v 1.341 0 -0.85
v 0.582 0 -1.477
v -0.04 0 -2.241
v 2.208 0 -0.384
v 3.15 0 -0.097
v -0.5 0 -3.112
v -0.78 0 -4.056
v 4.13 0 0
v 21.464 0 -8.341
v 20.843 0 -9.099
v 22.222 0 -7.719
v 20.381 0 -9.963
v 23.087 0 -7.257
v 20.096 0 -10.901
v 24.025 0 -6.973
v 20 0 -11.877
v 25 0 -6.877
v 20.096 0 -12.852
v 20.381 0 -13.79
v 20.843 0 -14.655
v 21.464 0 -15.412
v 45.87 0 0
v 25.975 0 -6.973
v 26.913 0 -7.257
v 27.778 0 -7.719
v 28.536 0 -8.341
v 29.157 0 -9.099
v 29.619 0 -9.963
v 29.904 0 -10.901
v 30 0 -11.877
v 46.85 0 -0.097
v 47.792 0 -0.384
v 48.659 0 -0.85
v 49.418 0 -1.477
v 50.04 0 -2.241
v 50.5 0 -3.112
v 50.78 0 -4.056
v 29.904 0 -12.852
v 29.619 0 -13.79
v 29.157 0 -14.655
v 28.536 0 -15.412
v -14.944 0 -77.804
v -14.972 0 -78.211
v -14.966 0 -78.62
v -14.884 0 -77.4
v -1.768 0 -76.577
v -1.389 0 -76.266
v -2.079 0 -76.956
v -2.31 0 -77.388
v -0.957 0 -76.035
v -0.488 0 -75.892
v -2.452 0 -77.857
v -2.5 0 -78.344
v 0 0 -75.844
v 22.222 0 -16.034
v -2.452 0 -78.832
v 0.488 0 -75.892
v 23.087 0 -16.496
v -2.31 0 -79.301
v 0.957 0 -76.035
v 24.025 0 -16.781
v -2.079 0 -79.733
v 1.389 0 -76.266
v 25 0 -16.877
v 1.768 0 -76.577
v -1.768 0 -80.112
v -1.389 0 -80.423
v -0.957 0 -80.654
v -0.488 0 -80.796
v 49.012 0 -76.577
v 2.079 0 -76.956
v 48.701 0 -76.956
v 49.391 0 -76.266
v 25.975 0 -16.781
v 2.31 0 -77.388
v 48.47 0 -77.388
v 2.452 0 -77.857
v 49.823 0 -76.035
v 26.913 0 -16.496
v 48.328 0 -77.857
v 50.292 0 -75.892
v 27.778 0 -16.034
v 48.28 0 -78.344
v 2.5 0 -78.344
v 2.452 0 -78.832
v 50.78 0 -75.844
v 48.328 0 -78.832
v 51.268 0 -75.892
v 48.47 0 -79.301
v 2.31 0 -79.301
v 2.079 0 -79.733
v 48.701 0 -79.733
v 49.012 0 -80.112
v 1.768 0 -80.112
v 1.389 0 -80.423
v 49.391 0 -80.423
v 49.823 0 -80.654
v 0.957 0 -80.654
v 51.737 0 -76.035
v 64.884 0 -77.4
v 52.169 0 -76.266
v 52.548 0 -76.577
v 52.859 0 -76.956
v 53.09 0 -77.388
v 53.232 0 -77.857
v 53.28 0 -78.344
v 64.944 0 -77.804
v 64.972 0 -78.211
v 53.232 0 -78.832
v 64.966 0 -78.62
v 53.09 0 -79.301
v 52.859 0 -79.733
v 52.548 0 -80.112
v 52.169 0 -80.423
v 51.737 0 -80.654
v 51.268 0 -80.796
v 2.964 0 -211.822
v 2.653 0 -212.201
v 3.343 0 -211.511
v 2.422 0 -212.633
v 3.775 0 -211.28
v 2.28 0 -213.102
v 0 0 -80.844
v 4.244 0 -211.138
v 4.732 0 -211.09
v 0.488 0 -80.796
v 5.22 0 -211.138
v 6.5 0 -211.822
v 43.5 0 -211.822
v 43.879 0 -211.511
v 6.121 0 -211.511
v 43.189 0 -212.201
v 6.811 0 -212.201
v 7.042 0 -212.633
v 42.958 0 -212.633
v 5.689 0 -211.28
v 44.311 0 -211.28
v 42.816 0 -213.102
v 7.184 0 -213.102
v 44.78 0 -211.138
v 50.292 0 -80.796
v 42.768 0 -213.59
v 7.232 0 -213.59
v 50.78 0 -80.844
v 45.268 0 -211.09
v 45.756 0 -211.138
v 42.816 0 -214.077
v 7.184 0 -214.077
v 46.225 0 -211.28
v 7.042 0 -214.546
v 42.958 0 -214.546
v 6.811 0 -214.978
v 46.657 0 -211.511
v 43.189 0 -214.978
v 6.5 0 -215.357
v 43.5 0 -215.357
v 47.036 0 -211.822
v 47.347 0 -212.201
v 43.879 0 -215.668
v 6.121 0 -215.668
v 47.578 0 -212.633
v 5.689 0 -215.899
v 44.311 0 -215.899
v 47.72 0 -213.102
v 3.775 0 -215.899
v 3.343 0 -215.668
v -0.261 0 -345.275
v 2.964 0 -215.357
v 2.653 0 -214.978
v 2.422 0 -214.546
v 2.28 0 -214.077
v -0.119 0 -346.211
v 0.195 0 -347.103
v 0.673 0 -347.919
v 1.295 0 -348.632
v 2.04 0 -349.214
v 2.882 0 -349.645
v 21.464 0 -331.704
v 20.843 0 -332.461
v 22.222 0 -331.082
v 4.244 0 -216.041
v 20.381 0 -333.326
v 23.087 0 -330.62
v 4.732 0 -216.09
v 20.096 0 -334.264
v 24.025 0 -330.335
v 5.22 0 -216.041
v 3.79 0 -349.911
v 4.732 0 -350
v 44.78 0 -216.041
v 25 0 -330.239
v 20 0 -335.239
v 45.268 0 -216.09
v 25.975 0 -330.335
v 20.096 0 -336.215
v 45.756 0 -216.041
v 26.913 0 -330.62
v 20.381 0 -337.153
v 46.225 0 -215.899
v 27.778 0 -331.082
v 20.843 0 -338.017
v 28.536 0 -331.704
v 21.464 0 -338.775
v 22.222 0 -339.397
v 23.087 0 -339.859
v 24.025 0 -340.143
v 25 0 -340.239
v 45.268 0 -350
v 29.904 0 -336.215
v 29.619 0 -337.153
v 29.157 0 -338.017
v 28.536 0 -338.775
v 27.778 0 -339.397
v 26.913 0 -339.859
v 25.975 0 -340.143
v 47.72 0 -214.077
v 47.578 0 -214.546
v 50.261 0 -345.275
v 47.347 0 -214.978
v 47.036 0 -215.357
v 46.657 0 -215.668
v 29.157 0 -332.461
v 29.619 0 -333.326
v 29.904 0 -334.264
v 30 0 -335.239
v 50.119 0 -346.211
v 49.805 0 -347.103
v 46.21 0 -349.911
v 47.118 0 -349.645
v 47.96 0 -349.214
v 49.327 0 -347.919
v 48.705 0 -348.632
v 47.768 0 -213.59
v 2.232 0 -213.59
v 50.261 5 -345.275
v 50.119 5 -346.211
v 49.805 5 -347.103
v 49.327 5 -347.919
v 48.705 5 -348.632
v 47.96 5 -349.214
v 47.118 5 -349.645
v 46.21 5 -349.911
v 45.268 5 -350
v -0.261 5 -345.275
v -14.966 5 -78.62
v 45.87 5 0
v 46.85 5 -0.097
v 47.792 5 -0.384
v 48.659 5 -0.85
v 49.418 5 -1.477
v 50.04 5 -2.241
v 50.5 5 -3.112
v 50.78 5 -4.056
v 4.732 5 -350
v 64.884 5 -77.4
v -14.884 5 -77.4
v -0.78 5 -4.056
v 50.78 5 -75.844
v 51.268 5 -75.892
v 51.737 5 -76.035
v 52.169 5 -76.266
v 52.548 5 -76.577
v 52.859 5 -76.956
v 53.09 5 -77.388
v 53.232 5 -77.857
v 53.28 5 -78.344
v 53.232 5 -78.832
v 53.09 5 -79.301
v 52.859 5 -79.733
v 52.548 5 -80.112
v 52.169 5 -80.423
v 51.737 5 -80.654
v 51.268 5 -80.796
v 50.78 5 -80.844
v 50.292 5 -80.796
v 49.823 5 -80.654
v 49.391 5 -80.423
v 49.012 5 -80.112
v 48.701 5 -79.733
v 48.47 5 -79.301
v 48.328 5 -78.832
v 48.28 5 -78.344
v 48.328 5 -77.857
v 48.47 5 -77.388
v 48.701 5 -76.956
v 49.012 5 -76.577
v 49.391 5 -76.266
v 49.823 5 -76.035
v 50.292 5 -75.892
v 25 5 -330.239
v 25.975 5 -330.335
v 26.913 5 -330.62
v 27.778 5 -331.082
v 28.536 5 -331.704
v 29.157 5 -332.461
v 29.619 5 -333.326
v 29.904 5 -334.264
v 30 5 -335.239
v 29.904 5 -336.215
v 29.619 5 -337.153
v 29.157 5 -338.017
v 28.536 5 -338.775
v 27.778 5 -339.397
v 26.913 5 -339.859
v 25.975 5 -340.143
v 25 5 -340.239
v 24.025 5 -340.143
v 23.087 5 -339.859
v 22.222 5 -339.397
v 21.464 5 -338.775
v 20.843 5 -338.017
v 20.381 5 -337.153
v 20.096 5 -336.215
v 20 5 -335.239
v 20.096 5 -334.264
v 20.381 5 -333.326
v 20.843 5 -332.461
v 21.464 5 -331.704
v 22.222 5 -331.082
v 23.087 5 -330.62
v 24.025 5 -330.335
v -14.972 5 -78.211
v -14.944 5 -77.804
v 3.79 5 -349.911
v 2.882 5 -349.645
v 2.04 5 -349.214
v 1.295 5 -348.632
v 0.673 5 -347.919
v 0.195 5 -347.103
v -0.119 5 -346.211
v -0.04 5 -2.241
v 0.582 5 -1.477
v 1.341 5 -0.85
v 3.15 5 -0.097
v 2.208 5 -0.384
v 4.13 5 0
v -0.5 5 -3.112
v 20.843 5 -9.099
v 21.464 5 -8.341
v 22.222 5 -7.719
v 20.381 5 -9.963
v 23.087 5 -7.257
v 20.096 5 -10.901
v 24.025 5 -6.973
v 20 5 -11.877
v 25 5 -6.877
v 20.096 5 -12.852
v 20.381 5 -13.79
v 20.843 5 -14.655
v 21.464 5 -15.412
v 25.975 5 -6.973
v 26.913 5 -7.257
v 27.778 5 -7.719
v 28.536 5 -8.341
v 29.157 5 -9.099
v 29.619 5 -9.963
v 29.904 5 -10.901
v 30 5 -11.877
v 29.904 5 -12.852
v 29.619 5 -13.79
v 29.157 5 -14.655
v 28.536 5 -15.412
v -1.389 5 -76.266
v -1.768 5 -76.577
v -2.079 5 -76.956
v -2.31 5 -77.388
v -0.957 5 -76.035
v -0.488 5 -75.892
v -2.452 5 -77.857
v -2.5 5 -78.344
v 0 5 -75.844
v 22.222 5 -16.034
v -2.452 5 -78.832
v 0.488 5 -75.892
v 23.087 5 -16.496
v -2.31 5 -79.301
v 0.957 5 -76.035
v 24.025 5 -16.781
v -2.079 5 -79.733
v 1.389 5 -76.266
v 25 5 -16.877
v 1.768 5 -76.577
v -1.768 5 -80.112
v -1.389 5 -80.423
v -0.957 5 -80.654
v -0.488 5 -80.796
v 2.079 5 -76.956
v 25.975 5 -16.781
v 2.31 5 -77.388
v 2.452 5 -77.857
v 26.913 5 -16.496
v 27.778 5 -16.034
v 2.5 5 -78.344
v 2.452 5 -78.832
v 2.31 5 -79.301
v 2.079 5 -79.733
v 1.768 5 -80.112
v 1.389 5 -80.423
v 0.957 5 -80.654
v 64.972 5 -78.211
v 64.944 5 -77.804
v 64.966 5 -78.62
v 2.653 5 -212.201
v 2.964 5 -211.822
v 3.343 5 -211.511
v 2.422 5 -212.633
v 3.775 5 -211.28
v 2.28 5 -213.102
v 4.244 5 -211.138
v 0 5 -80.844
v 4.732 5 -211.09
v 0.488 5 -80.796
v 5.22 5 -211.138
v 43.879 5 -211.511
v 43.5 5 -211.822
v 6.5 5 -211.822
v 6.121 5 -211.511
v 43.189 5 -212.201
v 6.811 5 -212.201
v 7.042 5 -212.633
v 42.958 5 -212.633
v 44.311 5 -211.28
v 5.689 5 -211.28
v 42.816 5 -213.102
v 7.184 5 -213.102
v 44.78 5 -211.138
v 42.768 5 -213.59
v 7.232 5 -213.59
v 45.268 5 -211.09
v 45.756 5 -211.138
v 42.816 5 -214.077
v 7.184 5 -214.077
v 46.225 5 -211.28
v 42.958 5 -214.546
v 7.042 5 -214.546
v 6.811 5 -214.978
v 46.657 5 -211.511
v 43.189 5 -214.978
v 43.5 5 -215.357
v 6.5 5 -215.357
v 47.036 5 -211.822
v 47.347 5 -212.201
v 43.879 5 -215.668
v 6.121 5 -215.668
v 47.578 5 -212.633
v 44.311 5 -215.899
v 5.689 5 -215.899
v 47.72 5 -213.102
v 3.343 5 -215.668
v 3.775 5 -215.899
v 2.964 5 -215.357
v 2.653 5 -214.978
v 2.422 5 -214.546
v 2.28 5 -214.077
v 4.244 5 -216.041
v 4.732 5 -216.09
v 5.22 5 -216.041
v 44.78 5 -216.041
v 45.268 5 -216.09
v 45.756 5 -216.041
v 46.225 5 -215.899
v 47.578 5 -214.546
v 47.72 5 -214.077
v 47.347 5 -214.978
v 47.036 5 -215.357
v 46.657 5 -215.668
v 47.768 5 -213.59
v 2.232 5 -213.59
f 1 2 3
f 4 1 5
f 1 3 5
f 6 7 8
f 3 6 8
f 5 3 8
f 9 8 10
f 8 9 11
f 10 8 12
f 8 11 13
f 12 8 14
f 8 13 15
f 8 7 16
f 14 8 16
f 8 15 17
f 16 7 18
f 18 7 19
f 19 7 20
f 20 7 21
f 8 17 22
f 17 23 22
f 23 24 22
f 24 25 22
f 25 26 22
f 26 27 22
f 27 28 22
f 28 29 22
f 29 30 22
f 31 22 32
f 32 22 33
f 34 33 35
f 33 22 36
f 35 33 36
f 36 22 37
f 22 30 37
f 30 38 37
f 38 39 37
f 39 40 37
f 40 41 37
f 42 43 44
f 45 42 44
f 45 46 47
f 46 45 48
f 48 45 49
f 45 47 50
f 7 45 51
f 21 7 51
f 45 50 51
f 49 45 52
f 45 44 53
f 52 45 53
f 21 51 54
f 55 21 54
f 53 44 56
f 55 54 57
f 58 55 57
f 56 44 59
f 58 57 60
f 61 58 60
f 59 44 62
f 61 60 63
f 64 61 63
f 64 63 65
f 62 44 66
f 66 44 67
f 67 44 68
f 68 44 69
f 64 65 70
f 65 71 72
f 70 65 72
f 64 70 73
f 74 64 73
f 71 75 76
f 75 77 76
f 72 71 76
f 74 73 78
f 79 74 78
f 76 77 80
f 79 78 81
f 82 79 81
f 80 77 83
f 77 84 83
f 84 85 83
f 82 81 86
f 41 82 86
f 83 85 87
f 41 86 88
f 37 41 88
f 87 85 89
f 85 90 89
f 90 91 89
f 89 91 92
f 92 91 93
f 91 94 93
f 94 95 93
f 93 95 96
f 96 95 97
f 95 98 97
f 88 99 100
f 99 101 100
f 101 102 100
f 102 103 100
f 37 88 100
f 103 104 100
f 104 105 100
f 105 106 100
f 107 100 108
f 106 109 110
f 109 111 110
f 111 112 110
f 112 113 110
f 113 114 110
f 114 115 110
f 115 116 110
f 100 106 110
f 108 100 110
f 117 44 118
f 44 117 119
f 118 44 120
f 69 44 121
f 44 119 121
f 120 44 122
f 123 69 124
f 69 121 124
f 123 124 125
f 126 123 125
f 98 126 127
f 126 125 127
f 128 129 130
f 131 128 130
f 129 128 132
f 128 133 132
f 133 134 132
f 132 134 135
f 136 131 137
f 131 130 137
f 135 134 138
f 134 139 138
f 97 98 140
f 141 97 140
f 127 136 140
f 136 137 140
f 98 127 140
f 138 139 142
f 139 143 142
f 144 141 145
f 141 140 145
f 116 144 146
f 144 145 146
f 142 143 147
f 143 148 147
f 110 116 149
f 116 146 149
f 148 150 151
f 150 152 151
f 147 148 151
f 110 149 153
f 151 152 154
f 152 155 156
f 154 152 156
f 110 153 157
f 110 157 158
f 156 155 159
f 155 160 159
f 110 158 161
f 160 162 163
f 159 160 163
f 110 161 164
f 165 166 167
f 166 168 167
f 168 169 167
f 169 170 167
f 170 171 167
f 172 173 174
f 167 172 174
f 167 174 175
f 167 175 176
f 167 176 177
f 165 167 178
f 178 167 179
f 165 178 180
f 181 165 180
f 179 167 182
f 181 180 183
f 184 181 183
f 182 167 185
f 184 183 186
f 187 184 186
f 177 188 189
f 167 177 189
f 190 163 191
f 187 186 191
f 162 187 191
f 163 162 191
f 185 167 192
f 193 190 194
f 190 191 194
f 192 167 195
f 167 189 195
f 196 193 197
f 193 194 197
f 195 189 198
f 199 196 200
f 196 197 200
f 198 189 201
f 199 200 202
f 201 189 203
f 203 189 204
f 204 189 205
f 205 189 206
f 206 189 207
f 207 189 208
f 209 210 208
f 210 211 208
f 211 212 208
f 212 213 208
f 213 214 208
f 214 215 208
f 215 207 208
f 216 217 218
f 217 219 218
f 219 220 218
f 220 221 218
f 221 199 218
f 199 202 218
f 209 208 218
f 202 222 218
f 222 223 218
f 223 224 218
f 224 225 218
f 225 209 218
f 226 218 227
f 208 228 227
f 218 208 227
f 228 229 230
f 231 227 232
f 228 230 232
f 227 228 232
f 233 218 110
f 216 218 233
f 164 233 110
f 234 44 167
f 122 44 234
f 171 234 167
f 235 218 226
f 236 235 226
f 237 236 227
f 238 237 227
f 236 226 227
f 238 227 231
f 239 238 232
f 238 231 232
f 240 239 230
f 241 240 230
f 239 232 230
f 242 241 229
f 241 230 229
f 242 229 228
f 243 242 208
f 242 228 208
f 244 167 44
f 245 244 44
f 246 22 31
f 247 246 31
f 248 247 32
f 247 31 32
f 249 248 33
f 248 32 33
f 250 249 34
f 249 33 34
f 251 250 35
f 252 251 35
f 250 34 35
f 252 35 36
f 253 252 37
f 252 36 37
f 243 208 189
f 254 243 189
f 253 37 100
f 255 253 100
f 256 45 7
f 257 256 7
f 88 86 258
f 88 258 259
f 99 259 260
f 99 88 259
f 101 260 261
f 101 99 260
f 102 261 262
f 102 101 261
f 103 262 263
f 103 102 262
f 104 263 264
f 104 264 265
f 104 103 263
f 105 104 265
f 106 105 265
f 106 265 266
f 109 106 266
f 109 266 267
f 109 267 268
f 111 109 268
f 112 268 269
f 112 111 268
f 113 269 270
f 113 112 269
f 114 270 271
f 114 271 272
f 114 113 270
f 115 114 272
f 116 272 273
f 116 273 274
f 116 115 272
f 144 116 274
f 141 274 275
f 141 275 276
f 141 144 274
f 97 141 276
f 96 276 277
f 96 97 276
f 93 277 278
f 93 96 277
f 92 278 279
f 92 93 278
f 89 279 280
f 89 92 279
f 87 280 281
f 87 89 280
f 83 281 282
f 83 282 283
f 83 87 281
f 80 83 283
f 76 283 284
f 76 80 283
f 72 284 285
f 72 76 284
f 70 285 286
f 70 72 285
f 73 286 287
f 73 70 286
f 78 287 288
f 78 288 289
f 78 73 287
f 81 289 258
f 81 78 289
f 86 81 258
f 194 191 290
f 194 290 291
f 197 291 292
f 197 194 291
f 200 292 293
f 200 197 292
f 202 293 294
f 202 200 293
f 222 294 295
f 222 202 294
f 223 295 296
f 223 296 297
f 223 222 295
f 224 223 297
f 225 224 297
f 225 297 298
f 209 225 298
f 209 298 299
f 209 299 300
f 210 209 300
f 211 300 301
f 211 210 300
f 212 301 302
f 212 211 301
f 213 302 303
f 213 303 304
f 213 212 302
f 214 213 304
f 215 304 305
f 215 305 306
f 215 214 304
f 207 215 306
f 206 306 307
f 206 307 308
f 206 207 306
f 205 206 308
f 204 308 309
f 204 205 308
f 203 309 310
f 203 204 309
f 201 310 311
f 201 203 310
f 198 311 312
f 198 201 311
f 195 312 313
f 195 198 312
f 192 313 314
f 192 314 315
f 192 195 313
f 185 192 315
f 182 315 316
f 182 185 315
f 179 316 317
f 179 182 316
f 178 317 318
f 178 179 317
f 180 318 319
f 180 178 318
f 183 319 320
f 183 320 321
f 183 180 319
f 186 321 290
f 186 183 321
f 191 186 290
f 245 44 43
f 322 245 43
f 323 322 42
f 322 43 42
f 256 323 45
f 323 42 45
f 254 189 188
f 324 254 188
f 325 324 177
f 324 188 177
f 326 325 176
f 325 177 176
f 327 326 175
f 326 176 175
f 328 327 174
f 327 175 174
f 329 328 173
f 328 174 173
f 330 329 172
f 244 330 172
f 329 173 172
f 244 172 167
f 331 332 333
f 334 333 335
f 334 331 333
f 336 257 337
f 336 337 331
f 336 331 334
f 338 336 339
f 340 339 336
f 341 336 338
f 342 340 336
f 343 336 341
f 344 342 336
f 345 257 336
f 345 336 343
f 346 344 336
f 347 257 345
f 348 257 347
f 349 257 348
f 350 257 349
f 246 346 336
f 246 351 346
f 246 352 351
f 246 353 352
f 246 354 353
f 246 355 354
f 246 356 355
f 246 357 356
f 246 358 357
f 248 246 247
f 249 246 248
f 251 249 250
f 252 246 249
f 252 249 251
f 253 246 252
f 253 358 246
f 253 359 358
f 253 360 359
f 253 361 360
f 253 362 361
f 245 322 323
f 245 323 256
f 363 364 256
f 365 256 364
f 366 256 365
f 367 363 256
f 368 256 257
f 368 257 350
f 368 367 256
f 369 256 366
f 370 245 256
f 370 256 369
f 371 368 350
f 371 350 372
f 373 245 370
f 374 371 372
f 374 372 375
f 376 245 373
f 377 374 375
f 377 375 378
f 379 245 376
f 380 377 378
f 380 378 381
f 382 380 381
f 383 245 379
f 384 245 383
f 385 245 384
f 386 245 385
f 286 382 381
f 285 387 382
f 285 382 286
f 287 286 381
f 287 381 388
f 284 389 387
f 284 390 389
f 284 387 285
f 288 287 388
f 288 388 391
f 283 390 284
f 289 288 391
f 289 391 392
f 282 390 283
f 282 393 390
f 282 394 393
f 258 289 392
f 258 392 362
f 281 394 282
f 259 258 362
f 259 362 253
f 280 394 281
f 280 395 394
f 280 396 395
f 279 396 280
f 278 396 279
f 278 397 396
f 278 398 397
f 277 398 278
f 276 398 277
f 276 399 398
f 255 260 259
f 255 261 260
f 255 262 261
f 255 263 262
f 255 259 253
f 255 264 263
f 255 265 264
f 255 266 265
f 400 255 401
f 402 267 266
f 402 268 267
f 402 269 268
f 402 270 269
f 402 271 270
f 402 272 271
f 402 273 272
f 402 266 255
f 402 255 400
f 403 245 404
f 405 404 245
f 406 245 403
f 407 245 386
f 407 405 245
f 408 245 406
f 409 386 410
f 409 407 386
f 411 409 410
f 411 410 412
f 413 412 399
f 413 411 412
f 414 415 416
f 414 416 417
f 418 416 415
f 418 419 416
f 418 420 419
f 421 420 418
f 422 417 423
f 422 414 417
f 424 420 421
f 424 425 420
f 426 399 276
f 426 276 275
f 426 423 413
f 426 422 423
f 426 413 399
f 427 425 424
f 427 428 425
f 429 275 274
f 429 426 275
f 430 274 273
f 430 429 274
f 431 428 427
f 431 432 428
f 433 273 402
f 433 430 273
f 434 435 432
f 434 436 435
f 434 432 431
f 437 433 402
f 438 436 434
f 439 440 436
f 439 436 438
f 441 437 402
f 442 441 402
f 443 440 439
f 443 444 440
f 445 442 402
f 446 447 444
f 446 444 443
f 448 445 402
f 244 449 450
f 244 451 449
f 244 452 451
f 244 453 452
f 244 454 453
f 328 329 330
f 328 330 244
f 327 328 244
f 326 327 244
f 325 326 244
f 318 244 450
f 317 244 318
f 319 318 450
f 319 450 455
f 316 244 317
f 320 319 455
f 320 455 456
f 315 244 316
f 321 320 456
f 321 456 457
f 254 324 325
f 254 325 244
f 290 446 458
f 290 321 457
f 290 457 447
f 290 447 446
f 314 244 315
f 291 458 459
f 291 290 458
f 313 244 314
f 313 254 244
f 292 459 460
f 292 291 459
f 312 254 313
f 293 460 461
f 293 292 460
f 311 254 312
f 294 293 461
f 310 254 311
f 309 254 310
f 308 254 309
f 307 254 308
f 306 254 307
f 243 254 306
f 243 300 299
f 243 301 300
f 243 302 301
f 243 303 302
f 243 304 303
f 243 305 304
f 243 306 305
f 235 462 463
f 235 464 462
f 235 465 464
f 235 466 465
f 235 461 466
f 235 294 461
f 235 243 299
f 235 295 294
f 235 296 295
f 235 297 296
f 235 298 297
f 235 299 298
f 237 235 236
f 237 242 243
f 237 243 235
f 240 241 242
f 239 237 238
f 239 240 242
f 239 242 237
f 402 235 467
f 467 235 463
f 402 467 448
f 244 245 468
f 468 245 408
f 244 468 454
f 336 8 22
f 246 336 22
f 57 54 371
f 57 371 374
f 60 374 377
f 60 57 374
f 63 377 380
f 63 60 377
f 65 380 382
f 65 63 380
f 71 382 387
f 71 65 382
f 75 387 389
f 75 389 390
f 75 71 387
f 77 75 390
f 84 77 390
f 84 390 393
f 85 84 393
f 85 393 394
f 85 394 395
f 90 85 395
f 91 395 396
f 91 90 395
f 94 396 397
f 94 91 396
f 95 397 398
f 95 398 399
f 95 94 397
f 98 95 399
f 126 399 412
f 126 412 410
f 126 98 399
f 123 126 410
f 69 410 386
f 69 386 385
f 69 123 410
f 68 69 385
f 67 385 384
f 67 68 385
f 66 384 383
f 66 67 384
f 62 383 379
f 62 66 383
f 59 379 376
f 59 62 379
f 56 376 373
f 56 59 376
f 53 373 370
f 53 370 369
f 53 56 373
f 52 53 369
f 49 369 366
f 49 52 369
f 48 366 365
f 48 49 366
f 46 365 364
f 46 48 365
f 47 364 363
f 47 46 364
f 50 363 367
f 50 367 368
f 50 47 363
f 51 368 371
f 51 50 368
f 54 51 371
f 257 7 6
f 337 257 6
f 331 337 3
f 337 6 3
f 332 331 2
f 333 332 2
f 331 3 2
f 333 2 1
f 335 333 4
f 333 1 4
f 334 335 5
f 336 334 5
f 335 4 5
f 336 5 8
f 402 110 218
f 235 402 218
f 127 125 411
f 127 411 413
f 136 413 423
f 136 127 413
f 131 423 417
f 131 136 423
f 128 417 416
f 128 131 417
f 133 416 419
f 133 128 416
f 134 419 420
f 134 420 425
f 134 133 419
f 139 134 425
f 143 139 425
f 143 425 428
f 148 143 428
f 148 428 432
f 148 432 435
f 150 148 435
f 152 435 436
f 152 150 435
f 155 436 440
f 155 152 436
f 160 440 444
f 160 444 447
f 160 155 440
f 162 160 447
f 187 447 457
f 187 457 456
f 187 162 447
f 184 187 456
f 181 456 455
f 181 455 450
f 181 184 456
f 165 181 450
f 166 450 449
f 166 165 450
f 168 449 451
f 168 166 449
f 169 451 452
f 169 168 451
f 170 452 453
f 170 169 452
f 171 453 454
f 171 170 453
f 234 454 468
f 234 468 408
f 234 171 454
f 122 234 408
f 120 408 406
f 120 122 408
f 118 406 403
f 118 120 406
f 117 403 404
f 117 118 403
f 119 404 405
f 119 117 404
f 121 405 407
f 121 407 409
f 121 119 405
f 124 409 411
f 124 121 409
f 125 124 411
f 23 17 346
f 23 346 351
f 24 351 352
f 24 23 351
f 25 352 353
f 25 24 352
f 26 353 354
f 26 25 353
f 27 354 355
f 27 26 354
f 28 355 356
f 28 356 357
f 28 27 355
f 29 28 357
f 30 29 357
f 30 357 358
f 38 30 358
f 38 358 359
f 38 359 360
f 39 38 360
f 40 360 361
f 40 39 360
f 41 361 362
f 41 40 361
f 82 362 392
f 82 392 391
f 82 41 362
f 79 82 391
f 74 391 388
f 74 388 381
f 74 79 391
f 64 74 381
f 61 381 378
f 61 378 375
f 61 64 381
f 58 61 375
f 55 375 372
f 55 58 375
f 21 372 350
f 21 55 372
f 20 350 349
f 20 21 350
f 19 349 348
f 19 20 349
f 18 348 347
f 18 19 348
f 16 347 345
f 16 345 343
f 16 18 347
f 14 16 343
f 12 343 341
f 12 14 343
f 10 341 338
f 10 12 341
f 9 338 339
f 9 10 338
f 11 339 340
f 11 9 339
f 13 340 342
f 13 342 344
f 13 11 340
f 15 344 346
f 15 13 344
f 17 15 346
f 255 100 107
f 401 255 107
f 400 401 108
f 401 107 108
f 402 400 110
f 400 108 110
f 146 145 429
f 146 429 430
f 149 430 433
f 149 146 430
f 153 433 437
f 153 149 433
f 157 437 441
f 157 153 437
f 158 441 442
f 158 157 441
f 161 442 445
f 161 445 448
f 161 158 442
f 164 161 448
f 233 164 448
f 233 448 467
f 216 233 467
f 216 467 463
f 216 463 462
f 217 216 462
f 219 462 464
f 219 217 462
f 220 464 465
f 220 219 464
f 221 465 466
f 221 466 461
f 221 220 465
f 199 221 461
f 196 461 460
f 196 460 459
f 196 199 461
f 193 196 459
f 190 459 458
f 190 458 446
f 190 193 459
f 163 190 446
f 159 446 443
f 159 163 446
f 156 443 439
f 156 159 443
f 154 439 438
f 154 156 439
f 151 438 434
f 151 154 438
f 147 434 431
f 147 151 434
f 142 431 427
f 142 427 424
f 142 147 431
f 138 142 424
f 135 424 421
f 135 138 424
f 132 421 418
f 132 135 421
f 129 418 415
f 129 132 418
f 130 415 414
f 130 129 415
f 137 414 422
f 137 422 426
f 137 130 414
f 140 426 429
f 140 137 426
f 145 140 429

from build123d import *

# Parameters (mm, degrees)
SKETCH1_R           = 2.5
SKETCH1_R_2         = 5
BOSS_EXTRUDE1_DEPTH = 5


with BuildPart() as part:
    # Sketch1 → Boss-Extrude1 (new body)
    with BuildSketch(Plane(origin=(0, 0, 0), x_dir=(1, 0, 0), z_dir=(0, 1, 0))):
        with BuildLine():
            Line((4.130127217, 0), (45.869872783, 0))
            ThreePointArc((45.869872783, 0), (49.054139071, 1.145074812), (50.779916111, 4.055820718))
            Line((50.779916111, 4.055820718), (64.883723024, 77.400263156))
            ThreePointArc((64.883723024, 77.400263156), (64.962312899, 78.007487301), (64.966093723, 78.619764391))
            Line((64.966093723, 78.619764391), (50.260556832, 345.275321952))
            ThreePointArc((50.260556832, 345.275321952), (48.704957481, 348.63157058), (45.268142804, 350))
            Line((45.268142804, 350), (4.731857196, 350))
            ThreePointArc((4.731857196, 350), (1.295042519, 348.63157058), (-0.260556832, 345.275321952))
            Line((-0.260556832, 345.275321952), (-14.966093723, 78.619764391))
            ThreePointArc((-14.966093723, 78.619764391), (-14.962312899, 78.007487301), (-14.883723024, 77.400263156))
            Line((-14.883723024, 77.400263156), (-0.779916111, 4.055820718))
            ThreePointArc((-0.779916111, 4.055820718), (0.945860929, 1.145074812), (4.130127217, 0))
        make_face()
        with Locations(Location((50.779916111, 78.344442439, 0), (0, 0, 270))):
            Circle(SKETCH1_R, mode=Mode.SUBTRACT)
        with Locations(Location((0, 78.344442439, 0), (0, 0, 270))):
            Circle(SKETCH1_R, mode=Mode.SUBTRACT)
        with Locations(Location((25, 11.876781334, 0), (0, 0, 270))):
            Circle(SKETCH1_R_2, mode=Mode.SUBTRACT)
        with Locations(Location((45.268142804, 213.58952196, 0), (0, 0, 270))):
            Circle(SKETCH1_R, mode=Mode.SUBTRACT)
        with Locations(Location((4.731857196, 213.58952196, 0), (0, 0, 270))):
            Circle(SKETCH1_R, mode=Mode.SUBTRACT)
        with Locations(Location((25, 335.239262598, 0), (0, 0, 270))):
            Circle(SKETCH1_R_2, mode=Mode.SUBTRACT)
    extrude(amount=BOSS_EXTRUDE1_DEPTH)


solid = part.part
